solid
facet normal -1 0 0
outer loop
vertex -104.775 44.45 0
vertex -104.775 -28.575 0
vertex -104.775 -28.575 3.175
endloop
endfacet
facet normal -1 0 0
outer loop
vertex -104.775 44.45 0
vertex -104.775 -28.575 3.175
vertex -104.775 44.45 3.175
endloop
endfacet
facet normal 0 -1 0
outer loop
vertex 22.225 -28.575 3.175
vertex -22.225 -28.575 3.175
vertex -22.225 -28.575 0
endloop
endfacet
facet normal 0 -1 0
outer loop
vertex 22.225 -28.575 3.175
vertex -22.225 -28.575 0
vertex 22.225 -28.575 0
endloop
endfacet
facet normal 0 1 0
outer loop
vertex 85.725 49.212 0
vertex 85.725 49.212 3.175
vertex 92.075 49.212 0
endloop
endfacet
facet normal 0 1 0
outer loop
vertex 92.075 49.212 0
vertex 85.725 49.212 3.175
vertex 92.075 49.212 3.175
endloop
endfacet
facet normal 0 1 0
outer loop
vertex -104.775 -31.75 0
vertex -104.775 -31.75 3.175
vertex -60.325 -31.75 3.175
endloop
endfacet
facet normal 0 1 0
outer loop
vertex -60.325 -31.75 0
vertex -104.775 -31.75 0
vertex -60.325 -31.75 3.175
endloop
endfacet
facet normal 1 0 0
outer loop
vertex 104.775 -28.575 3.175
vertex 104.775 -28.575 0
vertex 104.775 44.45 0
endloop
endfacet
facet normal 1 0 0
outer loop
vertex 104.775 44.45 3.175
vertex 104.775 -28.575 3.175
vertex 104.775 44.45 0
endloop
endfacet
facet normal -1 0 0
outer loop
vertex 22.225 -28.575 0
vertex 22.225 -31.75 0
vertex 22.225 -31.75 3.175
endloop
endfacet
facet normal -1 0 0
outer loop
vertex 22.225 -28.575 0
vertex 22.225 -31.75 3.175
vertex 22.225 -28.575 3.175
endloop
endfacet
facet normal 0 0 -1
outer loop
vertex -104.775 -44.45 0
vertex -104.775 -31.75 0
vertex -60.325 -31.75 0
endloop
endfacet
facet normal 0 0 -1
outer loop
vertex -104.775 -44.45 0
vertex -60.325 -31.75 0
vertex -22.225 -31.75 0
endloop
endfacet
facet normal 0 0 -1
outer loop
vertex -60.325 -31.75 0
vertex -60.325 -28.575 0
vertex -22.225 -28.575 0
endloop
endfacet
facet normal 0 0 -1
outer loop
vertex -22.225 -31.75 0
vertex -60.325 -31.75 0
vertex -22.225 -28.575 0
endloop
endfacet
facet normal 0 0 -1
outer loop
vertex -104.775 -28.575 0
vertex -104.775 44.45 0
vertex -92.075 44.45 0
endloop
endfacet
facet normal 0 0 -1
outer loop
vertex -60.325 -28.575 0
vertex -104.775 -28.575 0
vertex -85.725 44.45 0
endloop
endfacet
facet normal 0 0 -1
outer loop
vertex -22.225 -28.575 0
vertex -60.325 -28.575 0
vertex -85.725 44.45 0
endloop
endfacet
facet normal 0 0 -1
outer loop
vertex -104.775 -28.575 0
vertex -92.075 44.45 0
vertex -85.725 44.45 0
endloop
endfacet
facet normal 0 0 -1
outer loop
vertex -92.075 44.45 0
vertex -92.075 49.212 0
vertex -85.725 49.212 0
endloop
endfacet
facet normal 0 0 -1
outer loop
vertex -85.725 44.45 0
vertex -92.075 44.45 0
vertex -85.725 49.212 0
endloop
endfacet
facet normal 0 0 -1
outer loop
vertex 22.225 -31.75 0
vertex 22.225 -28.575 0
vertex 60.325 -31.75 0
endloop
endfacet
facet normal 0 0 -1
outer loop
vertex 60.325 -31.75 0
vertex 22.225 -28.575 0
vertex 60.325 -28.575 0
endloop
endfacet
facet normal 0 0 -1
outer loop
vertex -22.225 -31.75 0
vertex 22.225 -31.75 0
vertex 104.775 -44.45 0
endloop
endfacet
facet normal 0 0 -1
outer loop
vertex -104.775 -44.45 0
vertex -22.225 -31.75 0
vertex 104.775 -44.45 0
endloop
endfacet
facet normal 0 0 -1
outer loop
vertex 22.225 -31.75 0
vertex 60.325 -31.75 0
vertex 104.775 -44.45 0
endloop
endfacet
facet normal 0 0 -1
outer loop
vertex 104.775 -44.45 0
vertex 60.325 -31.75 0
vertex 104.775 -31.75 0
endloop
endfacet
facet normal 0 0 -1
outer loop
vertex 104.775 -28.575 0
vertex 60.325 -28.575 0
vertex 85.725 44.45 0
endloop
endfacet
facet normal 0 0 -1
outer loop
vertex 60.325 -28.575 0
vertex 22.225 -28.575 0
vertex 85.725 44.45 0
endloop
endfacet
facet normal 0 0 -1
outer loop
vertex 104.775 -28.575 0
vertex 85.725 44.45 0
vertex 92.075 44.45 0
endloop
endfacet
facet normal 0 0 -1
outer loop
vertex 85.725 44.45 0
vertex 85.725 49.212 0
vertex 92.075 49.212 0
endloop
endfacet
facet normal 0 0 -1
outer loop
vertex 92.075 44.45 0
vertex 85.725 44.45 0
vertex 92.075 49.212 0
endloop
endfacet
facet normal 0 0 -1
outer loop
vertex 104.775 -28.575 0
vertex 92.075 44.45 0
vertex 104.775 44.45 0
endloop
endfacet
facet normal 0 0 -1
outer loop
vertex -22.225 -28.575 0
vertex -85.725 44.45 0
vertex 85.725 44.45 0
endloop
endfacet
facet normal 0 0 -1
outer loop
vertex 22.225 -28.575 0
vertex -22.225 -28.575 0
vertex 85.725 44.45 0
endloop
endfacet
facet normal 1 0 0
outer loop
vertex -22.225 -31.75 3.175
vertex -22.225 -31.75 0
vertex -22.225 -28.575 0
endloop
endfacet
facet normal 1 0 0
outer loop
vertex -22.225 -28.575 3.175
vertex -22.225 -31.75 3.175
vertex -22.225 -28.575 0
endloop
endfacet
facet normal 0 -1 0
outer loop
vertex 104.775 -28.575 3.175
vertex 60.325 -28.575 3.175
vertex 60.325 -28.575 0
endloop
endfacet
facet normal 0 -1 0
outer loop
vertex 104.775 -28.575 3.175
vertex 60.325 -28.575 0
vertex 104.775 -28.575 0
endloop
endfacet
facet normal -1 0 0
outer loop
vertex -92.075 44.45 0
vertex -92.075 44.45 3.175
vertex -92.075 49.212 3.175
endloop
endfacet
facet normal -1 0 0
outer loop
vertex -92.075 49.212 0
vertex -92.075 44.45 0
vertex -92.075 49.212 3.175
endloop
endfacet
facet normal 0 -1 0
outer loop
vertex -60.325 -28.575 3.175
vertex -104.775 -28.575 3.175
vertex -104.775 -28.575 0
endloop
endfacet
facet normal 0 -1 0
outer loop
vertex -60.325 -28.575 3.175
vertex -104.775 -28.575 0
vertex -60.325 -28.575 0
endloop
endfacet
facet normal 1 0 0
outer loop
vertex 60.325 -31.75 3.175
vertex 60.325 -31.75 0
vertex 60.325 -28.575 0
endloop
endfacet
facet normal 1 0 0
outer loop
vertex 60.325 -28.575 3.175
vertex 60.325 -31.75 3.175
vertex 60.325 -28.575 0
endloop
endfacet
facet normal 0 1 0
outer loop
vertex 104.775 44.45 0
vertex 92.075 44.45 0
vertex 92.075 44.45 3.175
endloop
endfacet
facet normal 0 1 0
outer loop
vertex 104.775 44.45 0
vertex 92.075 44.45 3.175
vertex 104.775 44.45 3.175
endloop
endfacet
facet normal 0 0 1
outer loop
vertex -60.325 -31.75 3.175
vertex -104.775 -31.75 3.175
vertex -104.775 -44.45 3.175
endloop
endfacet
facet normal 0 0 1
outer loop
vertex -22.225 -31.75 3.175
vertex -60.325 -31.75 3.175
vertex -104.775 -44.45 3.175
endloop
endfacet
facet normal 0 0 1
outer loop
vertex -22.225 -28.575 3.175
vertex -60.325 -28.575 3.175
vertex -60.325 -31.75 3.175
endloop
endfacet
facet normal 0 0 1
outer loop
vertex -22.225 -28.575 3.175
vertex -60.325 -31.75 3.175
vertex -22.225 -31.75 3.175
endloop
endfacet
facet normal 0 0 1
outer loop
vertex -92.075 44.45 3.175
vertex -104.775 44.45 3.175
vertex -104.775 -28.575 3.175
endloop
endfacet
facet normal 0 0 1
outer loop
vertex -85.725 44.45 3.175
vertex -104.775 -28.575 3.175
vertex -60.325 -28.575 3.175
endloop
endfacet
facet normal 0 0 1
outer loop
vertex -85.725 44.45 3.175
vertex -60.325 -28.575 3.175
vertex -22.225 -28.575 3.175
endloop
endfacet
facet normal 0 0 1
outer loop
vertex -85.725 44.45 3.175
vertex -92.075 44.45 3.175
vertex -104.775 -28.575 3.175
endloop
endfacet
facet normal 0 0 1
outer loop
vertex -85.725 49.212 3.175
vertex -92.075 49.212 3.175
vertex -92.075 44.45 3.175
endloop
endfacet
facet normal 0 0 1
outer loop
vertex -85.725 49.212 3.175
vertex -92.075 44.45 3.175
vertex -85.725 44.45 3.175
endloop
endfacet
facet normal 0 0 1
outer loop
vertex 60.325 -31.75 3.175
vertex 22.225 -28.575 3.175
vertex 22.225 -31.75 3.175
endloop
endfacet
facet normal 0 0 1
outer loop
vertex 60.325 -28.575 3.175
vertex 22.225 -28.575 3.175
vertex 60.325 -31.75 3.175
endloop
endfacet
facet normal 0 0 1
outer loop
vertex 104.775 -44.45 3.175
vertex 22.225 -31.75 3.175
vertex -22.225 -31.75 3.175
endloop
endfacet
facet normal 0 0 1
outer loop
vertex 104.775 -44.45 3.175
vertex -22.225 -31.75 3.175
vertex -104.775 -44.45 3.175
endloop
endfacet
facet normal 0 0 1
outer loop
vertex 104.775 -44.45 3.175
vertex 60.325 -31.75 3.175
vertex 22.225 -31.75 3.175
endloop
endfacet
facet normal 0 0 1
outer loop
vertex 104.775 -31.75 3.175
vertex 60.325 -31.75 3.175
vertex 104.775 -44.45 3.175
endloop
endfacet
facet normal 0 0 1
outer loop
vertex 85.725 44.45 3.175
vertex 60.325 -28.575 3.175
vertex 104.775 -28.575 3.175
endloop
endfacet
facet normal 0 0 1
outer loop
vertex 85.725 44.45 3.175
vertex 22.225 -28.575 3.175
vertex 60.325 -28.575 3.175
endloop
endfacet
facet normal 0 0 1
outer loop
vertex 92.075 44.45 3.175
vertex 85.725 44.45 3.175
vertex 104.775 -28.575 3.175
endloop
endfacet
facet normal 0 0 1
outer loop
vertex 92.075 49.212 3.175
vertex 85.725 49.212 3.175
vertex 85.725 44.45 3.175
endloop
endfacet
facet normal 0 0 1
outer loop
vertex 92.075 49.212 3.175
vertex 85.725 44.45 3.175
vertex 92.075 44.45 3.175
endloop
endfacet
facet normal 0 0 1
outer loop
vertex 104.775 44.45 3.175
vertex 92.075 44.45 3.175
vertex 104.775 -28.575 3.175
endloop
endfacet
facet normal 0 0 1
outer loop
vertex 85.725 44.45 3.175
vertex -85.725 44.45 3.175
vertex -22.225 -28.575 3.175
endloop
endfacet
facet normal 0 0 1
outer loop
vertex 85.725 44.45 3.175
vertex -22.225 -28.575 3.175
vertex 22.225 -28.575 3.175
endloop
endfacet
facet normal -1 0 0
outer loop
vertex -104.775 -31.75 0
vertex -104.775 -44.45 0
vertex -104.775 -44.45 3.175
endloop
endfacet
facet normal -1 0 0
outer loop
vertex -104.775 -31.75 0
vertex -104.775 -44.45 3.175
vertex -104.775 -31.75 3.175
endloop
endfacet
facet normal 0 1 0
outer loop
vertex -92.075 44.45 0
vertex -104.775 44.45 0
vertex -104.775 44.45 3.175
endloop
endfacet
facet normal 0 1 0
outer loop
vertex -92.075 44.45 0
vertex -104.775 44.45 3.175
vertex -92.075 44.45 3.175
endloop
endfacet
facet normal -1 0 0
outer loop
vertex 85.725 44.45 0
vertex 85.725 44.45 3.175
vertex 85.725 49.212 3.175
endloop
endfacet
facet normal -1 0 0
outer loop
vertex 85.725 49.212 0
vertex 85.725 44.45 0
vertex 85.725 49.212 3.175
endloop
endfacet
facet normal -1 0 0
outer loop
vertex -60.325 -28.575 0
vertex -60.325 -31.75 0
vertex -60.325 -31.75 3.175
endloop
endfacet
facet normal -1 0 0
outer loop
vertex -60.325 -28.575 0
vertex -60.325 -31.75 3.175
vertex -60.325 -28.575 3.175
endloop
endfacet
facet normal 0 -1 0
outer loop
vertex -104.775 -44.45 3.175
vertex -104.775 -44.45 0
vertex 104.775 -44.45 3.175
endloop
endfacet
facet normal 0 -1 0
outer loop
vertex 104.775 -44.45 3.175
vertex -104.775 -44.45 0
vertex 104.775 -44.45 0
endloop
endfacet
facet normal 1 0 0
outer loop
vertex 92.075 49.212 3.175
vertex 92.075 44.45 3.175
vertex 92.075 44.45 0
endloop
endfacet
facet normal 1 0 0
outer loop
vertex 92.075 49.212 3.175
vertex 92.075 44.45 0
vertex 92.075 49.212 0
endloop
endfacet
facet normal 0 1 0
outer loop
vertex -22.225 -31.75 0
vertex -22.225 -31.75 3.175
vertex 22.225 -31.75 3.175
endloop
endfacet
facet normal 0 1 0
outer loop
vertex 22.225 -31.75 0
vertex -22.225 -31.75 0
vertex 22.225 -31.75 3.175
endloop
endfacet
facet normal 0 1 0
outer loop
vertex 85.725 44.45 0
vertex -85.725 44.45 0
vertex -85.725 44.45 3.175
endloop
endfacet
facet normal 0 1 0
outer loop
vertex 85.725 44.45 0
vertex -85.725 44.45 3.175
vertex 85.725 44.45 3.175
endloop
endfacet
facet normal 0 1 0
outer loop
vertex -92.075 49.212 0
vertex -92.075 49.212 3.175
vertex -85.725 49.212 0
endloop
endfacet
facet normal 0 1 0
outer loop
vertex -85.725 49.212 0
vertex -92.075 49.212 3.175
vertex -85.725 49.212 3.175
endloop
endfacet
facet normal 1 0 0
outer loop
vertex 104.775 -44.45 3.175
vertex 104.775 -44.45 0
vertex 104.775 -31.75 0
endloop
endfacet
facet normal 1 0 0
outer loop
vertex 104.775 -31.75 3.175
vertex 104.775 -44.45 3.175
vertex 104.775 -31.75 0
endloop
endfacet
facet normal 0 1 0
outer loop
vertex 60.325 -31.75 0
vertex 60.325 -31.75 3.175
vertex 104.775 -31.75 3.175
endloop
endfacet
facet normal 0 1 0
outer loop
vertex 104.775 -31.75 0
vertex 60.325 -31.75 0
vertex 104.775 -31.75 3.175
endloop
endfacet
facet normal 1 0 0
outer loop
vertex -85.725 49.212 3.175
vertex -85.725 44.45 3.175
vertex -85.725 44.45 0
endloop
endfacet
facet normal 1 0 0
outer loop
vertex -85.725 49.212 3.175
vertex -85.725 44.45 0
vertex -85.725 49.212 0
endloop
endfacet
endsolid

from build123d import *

# Parameters (mm, degrees)
F0_W     = 209.55
F0_H     = 88.9
F1_DEPTH = 3.175
F2_W     = 44.45
F2_H     = 3.175
F3_DEPTH = 25.4
F4_W     = 6.35
F4_H     = 4.7625
F5_DEPTH = 3.175


# Not quite as in the source:
# - a length typed as a fraction of an inch, garbled in the dataset ("3 / 203.2 mm" for 3/8 in), is restored


with BuildPart() as f1:
    # F0 (on Top) → F1 (new body)
    with BuildSketch(Plane.XY):
        Rectangle(F0_W, F0_H)
    extrude(amount=F1_DEPTH)

    # F2 (on face) → F3 (cut)
    with BuildSketch(Plane.XY.offset(3.175)):
        with Locations((-82.55, -30.1625)):
            Rectangle(F2_W, F2_H)
        with Locations((82.55, -30.1625)):
            Rectangle(F2_W, F2_H)
        with Locations((0, -30.1625)):
            Rectangle(F2_W, F2_H)
    extrude(amount=-F3_DEPTH, mode=Mode.SUBTRACT)

    # F4 (on face) → F5 (join)
    with BuildSketch(Plane.XY.offset(3.175)):
        with Locations((-88.9, 46.83125)):
            Rectangle(F4_W, F4_H)
        with Locations((88.9, 46.83125)):
            Rectangle(F4_W, F4_H)
    extrude(amount=-F5_DEPTH)


solid = f1.part
